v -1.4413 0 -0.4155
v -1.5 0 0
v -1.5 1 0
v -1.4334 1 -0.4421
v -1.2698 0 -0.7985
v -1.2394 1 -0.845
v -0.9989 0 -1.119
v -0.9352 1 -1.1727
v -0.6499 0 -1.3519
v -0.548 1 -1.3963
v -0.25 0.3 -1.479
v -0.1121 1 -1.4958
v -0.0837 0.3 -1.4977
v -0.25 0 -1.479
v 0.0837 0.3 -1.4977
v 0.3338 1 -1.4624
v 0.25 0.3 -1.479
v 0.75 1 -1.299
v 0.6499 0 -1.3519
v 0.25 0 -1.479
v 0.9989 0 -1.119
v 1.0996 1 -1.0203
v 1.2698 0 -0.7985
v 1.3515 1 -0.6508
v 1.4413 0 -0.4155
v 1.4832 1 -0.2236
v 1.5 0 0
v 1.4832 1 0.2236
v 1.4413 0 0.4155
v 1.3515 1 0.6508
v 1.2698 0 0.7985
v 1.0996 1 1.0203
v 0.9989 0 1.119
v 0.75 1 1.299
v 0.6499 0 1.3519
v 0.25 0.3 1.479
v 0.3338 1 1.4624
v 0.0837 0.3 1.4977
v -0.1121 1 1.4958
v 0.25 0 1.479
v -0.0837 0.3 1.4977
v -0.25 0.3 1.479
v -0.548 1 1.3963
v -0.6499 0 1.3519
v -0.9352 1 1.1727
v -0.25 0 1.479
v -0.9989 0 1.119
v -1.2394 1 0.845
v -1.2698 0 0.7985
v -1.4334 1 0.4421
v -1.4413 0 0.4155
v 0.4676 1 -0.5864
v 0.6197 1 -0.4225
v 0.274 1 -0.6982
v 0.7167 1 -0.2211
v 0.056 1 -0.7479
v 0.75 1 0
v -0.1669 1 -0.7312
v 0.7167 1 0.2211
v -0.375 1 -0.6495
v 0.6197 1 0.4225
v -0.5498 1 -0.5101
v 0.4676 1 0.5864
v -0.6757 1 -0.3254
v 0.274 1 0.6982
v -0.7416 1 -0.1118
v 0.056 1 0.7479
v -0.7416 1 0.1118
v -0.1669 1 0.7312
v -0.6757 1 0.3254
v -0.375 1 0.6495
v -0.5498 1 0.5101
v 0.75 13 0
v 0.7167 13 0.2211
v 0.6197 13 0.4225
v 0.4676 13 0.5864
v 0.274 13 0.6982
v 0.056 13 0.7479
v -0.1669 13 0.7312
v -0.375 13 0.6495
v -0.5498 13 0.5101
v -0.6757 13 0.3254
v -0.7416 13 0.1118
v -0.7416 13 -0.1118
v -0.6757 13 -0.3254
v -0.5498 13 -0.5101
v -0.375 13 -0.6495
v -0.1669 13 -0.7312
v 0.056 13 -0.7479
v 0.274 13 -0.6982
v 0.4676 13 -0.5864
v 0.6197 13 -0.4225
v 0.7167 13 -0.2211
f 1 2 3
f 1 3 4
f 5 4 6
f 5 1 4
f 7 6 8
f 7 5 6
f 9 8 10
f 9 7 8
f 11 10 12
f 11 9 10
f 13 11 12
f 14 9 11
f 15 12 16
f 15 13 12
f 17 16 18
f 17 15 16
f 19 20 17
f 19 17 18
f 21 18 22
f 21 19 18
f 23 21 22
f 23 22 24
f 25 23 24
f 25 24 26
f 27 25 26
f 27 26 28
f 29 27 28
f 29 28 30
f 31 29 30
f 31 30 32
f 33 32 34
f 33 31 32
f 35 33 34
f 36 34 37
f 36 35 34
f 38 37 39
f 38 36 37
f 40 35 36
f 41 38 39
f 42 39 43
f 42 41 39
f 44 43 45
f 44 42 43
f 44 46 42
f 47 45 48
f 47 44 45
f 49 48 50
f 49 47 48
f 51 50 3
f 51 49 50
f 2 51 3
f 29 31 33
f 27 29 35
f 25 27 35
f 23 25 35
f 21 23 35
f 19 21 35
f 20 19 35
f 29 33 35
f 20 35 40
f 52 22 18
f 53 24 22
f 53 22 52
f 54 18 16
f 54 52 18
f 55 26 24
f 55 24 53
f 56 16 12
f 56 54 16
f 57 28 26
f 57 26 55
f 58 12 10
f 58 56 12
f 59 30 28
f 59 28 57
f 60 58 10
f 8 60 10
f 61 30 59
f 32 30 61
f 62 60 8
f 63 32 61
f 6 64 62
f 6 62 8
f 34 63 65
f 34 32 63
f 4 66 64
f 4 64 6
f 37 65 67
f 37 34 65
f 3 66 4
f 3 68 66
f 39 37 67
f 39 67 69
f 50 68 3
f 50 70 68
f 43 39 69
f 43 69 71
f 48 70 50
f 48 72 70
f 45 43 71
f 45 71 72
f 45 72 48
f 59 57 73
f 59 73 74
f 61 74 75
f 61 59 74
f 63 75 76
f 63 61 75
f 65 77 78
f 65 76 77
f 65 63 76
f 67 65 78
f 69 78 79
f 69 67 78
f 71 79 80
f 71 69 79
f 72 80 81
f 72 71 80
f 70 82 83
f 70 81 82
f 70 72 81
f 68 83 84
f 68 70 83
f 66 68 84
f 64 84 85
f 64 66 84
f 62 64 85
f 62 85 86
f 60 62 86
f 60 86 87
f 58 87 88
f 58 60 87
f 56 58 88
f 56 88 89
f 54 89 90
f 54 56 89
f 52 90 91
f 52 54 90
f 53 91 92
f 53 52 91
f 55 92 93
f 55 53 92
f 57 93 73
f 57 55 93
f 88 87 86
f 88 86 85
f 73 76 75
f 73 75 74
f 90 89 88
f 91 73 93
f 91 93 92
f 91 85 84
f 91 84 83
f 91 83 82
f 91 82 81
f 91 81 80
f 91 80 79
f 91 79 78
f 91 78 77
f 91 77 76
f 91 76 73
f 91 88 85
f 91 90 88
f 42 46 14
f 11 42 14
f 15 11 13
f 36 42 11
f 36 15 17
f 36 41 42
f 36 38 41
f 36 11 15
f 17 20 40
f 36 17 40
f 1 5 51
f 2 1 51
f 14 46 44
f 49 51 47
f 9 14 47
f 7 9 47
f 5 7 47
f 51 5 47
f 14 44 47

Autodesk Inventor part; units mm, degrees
ref_plane "YZ Plane" through (0, 0, 0) normal (1, 0, 0) x (0, 1, 0)
ref_plane "XZ Plane" through (0, 0, 0) normal (0, 1, 0) x (-1, 0, 0)
ref_plane "XY Plane" through (0, 0, 0) normal (0, 0, 1) x (1, 0, 0)
sketch "Sketch1" plane through (0, 0, 0) normal (0, 1, 0) x (-1, 0, 0)
  circle A0 centre (0, 0) radius 1.5
  dimension "d0" = 3
extrude "Extrusion1" add sketch "Sketch1" along normal blind 1
sketch "Sketch2" plane through (0, 1, 0) normal (0, 1, 0) x (1, 0, 0)
  circle A0 centre (0, 0) radius 0.75
  dimension "d3" = 1.5
extrude "Extrusion2" add sketch "Sketch2" along normal blind 12
sketch "Sketch3" plane through (0, 0, 0) normal (0, -1, 0) x (1, 0, 0)
  line L0 (0.25, 1.5) -> (-0.25, 1.5)
  line L1 (-0.25, 1.5) -> (-0.25, -1.5)
  line L2 (-0.25, -1.5) -> (0.25, -1.5)
  line L3 (0.25, -1.5) -> (0.25, 1.5)
  line L4 (0.25, 1.5) -> (-0.25, -1.5) construction
  line L5 (-0.25, 1.5) -> (0.25, -1.5) construction
  circle A0 centre (0, 0) radius 1.5 projected
  point P0 (0.25, -1.479)
  point P1 (0.25, 1.479)
  point P2 (-0.25, 1.479)
  point P3 (-0.25, -1.479)
  dimension "d6" = 0.5
extrude "Extrusion3" cut sketch "Sketch3" against normal blind 0.3 contours A0 L3 L1
properties part number "m1.5_bolt_12mm" material "Brass, Soft Yellow"
